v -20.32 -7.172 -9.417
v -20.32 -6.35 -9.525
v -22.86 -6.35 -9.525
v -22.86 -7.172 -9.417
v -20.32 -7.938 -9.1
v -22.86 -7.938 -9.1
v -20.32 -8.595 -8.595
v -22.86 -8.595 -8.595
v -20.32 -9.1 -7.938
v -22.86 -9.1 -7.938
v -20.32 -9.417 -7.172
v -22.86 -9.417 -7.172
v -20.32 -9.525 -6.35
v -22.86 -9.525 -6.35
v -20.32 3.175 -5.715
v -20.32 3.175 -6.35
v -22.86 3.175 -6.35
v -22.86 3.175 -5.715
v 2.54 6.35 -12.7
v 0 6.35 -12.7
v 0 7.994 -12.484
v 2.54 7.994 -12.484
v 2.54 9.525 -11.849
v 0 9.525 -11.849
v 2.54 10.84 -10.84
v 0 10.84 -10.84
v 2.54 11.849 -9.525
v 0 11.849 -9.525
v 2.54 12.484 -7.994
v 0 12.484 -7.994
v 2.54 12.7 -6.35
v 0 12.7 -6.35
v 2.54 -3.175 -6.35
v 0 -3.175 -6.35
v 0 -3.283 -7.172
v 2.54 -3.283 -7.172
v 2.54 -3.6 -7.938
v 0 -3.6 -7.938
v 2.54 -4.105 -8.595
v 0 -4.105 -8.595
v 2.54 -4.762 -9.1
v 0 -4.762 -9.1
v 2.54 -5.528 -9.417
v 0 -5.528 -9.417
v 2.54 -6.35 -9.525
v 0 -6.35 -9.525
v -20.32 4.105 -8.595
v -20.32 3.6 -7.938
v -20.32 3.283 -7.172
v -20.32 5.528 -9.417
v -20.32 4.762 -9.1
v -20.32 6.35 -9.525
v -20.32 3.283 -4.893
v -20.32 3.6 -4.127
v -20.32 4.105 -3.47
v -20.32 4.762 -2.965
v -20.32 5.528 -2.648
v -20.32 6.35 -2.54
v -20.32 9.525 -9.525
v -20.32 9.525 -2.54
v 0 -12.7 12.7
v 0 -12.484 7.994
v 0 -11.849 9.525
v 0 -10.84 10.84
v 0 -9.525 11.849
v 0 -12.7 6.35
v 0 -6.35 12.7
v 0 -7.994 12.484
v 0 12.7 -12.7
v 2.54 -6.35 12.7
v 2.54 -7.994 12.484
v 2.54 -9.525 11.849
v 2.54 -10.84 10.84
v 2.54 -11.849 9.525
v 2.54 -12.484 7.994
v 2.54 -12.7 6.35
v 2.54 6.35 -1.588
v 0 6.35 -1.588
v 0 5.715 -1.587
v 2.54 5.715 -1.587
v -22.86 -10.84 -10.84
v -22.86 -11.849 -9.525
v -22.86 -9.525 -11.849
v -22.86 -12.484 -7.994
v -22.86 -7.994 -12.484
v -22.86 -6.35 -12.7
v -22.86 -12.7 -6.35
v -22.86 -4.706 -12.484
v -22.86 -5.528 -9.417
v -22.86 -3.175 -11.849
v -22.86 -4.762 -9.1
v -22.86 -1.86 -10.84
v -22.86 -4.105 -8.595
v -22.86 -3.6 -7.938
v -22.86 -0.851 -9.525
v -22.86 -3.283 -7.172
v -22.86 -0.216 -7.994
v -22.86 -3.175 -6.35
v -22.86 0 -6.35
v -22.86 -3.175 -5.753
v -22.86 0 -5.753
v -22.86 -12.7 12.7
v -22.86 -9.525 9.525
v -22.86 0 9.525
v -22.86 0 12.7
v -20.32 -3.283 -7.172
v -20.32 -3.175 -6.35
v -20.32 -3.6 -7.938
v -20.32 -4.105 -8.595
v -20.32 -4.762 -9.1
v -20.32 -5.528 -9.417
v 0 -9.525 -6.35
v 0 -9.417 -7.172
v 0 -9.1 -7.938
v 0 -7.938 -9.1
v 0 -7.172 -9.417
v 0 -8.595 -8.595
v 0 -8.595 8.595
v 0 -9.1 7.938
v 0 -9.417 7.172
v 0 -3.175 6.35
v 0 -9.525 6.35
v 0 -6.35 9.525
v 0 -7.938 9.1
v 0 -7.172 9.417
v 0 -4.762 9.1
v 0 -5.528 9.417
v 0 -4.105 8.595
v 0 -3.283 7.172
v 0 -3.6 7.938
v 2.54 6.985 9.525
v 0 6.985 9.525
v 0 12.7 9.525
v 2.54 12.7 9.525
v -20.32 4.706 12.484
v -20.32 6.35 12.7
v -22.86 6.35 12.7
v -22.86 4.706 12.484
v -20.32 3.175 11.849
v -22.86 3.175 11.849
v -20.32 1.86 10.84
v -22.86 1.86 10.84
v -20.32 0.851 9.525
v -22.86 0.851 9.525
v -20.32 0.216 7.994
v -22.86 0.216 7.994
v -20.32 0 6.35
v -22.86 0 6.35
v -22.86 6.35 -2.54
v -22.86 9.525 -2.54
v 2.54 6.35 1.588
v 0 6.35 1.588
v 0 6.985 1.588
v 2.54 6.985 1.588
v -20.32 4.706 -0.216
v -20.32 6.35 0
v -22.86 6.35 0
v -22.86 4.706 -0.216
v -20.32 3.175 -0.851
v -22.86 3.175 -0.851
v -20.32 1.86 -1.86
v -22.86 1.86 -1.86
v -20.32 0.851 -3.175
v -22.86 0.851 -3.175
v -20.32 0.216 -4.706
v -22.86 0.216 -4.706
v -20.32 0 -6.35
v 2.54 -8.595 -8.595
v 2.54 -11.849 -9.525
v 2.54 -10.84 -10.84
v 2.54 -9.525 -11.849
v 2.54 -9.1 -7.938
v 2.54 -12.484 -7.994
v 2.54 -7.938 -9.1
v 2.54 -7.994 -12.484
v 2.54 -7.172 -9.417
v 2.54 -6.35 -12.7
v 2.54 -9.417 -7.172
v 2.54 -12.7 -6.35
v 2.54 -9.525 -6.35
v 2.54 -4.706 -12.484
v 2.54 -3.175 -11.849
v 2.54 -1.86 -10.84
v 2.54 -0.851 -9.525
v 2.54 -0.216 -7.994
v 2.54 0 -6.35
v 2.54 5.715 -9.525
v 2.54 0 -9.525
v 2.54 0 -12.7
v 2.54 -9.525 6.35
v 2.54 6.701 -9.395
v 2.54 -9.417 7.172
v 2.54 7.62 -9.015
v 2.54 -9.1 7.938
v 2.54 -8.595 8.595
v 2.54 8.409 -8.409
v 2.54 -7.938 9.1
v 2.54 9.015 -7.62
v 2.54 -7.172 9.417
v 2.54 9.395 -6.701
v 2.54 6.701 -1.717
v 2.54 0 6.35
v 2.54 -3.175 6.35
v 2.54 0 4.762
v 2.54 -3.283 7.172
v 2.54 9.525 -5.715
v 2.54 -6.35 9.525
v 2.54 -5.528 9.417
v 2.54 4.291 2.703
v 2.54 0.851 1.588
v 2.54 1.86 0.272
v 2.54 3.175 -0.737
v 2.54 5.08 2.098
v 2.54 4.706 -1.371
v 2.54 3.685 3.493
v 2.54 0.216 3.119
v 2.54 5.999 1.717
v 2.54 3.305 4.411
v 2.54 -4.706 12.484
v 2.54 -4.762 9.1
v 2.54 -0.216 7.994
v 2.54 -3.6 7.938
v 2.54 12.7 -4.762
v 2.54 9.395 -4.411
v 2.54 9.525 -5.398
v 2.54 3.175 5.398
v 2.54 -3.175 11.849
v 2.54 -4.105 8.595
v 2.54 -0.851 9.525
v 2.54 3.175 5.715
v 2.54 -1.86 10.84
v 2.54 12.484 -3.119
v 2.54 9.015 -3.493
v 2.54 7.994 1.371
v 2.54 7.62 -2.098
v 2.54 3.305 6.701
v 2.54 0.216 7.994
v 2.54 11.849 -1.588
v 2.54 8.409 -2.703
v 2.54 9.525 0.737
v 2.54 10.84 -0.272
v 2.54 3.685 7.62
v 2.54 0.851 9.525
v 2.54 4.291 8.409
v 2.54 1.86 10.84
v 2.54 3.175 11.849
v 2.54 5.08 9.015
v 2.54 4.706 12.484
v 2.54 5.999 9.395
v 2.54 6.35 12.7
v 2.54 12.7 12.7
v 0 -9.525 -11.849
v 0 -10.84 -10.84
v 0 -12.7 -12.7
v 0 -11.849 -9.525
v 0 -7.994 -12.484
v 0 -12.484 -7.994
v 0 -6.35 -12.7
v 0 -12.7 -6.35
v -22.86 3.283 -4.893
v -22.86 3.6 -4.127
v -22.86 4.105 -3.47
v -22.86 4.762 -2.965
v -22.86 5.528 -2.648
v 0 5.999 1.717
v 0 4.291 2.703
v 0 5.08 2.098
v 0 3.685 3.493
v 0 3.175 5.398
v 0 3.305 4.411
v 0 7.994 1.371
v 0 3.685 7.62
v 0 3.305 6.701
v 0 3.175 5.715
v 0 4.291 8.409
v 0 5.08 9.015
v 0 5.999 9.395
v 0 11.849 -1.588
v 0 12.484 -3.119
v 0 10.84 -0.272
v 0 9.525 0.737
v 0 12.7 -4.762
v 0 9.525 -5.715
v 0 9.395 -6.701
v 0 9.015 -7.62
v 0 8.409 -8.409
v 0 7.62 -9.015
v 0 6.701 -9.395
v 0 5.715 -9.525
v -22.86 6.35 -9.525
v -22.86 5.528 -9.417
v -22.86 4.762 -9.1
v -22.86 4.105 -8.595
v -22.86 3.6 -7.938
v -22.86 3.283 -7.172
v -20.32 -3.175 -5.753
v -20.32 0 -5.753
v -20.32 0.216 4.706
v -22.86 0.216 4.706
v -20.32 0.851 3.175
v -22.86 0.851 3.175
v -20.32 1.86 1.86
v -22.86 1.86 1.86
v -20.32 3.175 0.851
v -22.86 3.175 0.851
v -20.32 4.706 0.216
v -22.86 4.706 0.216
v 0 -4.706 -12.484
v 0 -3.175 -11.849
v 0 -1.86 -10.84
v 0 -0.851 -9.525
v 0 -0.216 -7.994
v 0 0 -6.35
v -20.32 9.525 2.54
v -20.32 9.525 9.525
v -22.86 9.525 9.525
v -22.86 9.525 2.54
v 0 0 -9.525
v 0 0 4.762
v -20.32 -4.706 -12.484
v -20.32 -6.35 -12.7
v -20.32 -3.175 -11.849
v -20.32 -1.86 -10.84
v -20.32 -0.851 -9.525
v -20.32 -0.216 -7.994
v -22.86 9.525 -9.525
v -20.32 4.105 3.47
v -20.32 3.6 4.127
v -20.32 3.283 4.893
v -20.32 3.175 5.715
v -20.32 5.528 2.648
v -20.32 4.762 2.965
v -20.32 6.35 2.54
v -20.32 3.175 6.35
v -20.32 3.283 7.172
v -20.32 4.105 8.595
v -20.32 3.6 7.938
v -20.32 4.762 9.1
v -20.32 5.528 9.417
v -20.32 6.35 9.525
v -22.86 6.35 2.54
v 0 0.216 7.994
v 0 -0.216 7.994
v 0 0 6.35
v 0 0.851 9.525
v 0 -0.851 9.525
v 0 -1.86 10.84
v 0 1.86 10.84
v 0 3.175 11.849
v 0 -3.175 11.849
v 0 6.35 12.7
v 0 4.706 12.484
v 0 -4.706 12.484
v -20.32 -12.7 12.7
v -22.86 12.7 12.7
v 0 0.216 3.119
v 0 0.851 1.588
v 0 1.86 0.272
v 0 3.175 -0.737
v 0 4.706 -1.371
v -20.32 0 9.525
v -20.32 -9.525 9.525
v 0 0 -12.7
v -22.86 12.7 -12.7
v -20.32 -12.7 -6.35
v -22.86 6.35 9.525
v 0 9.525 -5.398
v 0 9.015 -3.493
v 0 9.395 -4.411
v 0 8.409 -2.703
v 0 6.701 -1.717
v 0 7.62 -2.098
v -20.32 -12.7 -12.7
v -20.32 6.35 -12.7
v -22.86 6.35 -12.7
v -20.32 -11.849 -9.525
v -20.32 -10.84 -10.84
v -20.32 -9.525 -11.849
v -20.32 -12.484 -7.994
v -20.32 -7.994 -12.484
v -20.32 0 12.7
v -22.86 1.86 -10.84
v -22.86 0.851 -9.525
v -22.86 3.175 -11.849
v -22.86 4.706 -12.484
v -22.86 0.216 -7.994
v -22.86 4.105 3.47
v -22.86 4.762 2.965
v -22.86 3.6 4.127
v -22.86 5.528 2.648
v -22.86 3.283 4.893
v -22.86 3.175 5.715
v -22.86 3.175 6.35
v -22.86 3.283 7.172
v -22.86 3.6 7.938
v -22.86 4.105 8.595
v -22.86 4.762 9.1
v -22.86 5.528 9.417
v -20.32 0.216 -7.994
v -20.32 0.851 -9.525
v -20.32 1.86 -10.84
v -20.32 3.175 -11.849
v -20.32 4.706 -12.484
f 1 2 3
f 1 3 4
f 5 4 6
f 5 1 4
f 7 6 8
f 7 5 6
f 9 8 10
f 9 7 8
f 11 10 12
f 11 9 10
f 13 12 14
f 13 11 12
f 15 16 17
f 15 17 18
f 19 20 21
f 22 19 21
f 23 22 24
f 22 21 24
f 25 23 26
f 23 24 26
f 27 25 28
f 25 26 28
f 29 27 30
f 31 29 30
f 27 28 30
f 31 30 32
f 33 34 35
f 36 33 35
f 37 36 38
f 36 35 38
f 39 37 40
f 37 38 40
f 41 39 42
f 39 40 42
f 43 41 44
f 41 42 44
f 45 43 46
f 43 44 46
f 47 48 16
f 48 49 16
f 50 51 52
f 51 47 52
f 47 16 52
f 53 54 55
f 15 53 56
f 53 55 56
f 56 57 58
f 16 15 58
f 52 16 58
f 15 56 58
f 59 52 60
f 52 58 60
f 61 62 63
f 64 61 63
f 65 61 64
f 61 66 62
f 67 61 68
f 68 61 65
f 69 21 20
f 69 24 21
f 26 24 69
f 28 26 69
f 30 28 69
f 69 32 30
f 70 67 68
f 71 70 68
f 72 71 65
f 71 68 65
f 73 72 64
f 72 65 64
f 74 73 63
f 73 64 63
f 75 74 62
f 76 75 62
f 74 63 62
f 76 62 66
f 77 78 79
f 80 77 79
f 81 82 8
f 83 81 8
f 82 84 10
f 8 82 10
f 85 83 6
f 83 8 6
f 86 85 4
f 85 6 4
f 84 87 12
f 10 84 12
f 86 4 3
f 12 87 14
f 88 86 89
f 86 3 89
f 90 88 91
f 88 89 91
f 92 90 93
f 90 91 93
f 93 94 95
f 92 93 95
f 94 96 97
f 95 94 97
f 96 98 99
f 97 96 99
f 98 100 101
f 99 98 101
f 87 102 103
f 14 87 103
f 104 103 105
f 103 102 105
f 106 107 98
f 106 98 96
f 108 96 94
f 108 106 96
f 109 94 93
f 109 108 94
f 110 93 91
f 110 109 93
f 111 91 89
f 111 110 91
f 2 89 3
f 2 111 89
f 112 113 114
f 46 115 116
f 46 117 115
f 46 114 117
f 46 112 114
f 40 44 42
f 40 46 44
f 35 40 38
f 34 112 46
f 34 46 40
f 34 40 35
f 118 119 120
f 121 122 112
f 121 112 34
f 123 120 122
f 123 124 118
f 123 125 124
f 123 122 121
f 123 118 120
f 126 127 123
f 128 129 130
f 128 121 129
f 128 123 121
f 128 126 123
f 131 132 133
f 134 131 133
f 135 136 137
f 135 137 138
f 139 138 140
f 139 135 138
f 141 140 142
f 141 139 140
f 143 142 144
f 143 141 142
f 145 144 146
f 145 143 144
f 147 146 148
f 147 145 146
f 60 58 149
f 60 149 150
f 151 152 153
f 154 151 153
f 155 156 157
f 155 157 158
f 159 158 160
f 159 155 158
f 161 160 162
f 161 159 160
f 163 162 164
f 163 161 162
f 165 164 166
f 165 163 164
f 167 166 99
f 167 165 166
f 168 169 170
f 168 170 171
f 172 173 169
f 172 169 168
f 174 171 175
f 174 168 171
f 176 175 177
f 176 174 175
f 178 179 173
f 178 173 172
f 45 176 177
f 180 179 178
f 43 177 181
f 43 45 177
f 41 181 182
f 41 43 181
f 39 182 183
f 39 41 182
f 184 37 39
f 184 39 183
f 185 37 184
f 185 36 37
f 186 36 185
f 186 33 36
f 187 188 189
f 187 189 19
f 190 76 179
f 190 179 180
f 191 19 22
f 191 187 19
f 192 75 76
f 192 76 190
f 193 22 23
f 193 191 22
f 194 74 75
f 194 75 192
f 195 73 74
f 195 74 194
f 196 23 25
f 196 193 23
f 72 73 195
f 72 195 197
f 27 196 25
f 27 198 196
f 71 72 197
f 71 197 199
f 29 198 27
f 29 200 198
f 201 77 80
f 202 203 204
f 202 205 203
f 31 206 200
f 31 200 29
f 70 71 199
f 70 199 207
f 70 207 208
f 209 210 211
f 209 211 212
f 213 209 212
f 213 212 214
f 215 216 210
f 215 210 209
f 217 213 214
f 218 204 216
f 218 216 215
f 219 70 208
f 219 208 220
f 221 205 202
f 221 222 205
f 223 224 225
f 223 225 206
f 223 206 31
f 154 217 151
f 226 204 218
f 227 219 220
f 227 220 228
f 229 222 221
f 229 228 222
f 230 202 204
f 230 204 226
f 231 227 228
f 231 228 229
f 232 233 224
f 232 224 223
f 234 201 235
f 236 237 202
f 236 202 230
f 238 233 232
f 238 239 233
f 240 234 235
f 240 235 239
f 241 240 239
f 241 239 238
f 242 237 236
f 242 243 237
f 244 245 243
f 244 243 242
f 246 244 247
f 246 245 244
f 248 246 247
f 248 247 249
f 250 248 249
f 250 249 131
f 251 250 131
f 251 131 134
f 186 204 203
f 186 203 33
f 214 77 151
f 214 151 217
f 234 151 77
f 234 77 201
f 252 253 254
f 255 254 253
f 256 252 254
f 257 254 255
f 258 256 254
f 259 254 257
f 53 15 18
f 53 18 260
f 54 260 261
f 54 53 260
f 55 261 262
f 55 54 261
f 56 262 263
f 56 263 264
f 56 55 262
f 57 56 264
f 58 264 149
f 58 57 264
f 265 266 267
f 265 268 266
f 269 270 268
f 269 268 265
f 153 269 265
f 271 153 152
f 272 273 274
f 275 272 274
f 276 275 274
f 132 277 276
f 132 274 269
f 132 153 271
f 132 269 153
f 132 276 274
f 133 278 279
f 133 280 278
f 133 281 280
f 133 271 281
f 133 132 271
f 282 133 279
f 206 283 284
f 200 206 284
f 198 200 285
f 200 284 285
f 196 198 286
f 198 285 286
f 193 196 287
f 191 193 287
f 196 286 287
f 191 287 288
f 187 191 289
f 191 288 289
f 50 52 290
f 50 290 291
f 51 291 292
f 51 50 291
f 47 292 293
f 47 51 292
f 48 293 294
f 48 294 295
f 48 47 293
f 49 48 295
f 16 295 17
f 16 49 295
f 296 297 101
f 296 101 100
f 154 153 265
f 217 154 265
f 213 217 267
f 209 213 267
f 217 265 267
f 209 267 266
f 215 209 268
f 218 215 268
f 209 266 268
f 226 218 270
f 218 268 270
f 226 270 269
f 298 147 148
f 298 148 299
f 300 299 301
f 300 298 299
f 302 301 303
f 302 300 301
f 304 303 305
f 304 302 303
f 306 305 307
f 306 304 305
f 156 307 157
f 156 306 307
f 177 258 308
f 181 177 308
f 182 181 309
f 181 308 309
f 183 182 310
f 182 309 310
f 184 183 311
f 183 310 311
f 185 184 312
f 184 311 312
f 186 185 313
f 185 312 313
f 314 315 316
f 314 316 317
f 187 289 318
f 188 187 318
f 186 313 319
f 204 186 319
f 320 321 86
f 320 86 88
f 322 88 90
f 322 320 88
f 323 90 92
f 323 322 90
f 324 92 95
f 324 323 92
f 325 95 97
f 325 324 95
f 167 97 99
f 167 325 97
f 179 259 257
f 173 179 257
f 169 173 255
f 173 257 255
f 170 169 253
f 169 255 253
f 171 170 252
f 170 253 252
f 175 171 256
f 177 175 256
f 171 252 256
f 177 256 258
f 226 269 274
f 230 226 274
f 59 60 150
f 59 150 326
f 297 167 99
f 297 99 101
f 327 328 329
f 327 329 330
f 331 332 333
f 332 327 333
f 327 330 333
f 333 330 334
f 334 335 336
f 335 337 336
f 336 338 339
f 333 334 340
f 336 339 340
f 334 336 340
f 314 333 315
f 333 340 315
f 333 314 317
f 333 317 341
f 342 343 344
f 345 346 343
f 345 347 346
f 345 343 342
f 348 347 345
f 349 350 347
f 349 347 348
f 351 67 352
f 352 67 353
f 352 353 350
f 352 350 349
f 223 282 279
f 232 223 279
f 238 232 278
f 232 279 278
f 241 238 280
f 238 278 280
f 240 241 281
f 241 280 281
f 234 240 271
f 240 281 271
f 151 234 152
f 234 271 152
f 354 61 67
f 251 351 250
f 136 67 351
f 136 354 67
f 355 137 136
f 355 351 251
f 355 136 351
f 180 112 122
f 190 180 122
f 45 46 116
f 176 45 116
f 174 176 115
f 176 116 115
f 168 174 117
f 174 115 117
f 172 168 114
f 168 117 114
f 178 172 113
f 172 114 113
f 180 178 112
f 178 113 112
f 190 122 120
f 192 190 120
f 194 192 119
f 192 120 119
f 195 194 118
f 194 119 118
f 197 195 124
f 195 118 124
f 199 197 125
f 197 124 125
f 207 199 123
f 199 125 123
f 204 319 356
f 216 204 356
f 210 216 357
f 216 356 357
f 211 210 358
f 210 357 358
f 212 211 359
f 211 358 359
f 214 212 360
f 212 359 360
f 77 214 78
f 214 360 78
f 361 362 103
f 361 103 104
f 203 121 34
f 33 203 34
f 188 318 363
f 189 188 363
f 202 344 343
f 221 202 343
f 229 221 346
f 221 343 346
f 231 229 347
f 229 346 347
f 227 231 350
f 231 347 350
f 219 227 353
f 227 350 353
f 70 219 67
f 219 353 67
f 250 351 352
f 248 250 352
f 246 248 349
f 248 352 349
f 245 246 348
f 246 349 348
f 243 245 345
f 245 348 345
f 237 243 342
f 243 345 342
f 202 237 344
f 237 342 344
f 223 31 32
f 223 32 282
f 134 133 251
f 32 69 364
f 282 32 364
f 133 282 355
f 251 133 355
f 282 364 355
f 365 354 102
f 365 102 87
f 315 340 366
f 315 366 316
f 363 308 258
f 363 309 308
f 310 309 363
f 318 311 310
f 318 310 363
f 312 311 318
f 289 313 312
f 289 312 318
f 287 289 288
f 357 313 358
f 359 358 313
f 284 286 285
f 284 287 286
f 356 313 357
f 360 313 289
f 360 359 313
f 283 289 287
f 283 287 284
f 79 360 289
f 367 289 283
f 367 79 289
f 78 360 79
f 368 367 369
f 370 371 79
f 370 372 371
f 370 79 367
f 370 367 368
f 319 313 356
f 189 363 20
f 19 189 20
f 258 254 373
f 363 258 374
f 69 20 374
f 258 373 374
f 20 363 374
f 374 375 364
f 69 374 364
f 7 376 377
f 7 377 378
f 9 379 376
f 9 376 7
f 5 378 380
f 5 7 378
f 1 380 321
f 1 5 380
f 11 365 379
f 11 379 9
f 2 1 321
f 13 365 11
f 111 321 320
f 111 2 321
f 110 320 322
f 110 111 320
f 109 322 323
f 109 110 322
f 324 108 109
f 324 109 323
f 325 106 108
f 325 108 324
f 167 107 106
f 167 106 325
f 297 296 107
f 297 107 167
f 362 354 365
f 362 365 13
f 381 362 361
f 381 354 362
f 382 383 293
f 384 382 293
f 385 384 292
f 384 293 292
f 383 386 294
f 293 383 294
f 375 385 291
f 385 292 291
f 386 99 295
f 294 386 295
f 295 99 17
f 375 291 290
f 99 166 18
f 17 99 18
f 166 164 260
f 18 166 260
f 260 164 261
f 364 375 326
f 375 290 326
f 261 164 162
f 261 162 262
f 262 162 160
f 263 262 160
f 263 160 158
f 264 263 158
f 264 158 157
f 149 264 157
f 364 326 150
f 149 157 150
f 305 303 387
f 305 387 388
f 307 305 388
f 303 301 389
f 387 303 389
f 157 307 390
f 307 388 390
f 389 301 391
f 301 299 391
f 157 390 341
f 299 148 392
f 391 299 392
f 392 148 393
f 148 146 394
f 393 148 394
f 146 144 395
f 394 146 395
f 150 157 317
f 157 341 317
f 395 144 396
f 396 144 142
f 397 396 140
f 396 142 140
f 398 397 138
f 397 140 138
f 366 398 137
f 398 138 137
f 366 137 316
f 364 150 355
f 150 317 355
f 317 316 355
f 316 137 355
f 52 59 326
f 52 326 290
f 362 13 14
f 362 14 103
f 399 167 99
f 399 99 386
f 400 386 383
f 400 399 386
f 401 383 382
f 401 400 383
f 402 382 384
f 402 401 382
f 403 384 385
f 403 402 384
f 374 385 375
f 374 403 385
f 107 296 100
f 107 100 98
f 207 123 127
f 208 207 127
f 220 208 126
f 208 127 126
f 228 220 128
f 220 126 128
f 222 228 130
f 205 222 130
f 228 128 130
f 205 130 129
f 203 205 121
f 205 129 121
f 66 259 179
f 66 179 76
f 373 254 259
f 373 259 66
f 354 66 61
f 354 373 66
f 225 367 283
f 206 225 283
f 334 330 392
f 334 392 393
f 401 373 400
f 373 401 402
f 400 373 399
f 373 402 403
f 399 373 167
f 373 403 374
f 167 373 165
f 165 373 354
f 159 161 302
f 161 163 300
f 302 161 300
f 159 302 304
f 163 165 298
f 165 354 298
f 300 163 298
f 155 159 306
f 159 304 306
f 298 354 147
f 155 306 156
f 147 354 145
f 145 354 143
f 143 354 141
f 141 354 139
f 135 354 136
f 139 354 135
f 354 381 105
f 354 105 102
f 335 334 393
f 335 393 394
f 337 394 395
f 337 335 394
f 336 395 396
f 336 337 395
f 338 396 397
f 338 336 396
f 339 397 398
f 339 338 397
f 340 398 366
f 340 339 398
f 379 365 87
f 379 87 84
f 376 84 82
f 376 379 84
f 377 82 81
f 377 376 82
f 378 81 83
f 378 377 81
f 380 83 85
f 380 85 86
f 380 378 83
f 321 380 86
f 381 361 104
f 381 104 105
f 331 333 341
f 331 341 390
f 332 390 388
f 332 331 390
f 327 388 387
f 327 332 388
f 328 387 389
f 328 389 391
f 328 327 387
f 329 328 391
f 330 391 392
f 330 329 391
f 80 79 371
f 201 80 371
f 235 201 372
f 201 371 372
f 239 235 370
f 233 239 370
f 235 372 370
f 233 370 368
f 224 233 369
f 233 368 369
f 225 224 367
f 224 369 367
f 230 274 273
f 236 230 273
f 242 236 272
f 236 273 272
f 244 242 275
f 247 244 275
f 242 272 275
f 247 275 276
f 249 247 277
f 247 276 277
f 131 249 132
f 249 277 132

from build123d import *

# Parameters (mm, degrees)
F3_DEPTH = 2.54
F4_DEPTH = 2.54
F5_W     = 25.4
F5_H     = 25.4
F6_DEPTH = 20.32


with BuildPart() as f3:
    # F0 (on Right) → F3 (new body)
    with BuildSketch(Plane.YZ):
        with BuildLine():
            Line((0, 4.7625), (0, 6.35))
            ThreePointArc((0, 6.35), (-1.8598719395, 10.8401280605), (-6.35, 12.7))
            ThreePointArc((-6.35, 12.7), (-10.8401280605, 10.8401280605), (-12.7, 6.35))
            Line((-12.7, 6.35), (-12.7, -6.35))
            ThreePointArc((-12.7, -6.35), (-10.8401280605, -10.8401280605), (-6.35, -12.7))
            ThreePointArc((-6.35, -12.7), (-1.8598719395, -10.8401280605), (0, -6.35))
            Line((0, -6.35), (0, -3.81))
            Line((0, -3.81), (0, 4.7625))
        make_face()
        with BuildLine():
            ThreePointArc((-6.35, 9.525), (-4.1049359697, 8.5950640303), (-3.175, 6.35))
            Line((-3.175, 6.35), (-3.175, -6.35))
            ThreePointArc((-3.175, -6.35), (-4.1049359697, -8.5950640303), (-6.35, -9.525))
            ThreePointArc((-6.35, -9.525), (-8.5950640303, -8.5950640303), (-9.525, -6.35))
            Line((-9.525, -6.35), (-9.525, 6.35))
            ThreePointArc((-9.525, 6.35), (-8.5950640303, 8.5950640303), (-6.35, 9.525))
        make_face(mode=Mode.SUBTRACT)
        with BuildLine():
            Line((12.7, 12.7), (11.43, 12.7))
            Line((11.43, 12.7), (6.35, 12.7))
            ThreePointArc((6.35, 12.7), (1.8598719395, 10.8401280605), (0, 6.35))
            Line((0, 6.35), (0, 4.7625))
            ThreePointArc((0, 4.7625), (1.8598719395, 0.2723719395), (6.35, -1.5875))
            Line((6.35, -1.5875), (5.715, -1.5875))
            ThreePointArc((5.715, -1.5875), (8.4090768363, -2.7034231637), (9.525, -5.3975))
            Line((9.525, -5.3975), (9.525, -5.715))
            ThreePointArc((9.525, -5.715), (8.4090768363, -8.4090768363), (5.715, -9.525))
            Line((5.715, -9.525), (1.27, -9.525))
            Line((1.27, -9.525), (0, -9.525))
            Line((0, -9.525), (0, -12.7))
            Line((0, -12.7), (1.27, -12.7))
            Line((1.27, -12.7), (6.35, -12.7))
            ThreePointArc((6.35, -12.7), (10.8401280605, -10.8401280605), (12.7, -6.35))
            Line((12.7, -6.35), (12.7, -4.7625))
            ThreePointArc((12.7, -4.7625), (10.8401280605, -0.2723719395), (6.35, 1.5875))
            Line((6.35, 1.5875), (6.985, 1.5875))
            ThreePointArc((6.985, 1.5875), (4.2909231637, 2.7034231637), (3.175, 5.3975))
            Line((3.175, 5.3975), (3.175, 5.715))
            ThreePointArc((3.175, 5.715), (4.2909231637, 8.4090768363), (6.985, 9.525))
            Line((6.985, 9.525), (11.43, 9.525))
            Line((11.43, 9.525), (12.7, 9.525))
            Line((12.7, 9.525), (12.7, 12.7))
        make_face()
    extrude(amount=F3_DEPTH)



with BuildPart() as f4:
    # F2 (on offset) → F4 (new body)
    with BuildSketch(Plane.YZ.offset(-20.32)):
        with BuildLine():
            Line((12.7, -12.7), (12.7, 12.7))
            Line((12.7, 12.7), (6.35, 12.7))
            ThreePointArc((6.35, 12.7), (1.8598719395, 10.8401280605), (0, 6.35))
            ThreePointArc((0, 6.35), (1.8598719395, 1.8598719395), (6.35, 0))
            ThreePointArc((6.35, 0), (1.8598719395, -1.8598719395), (0, -6.35))
            ThreePointArc((0, -6.35), (1.8598719395, -10.8401280605), (6.35, -12.7))
            Line((6.35, -12.7), (12.7, -12.7))
        make_face()
        with BuildLine():
            Line((9.525, -2.54), (9.525, -9.525))
            Line((9.525, -9.525), (6.35, -9.525))
            ThreePointArc((6.35, -9.525), (4.1049359697, -8.5950640303), (3.175, -6.35))
            Line((3.175, -6.35), (3.175, -5.715))
            ThreePointArc((3.175, -5.715), (4.1049359697, -3.4699359697), (6.35, -2.54))
            Line((6.35, -2.54), (9.525, -2.54))
        make_face(mode=Mode.SUBTRACT)
        with BuildLine():
            Line((6.35, 9.525), (9.525, 9.525))
            Line((9.525, 9.525), (9.525, 2.54))
            Line((9.525, 2.54), (6.35, 2.54))
            ThreePointArc((6.35, 2.54), (4.1049359697, 3.4699359697), (3.175, 5.715))
            Line((3.175, 5.715), (3.175, 6.35))
            ThreePointArc((3.175, 6.35), (4.1049359697, 8.5950640303), (6.35, 9.525))
        make_face(mode=Mode.SUBTRACT)
    extrude(amount=-F4_DEPTH)


with BuildPart() as f4b:
    # F2 (on offset) → F4, piece 2 (new body)
    with BuildSketch(Plane.YZ.offset(-20.32)):
        with BuildLine():
            ThreePointArc((-6.35, -12.7), (-1.8598719395, -10.8401280605), (0, -6.35))
            Line((0, -6.35), (0, -5.7529052719))
            Line((0, -5.7529052719), (-3.175, -5.7529052719))
            Line((-3.175, -5.7529052719), (-3.175, -6.35))
            ThreePointArc((-3.175, -6.35), (-4.1049359697, -8.5950640303), (-6.35, -9.525))
            ThreePointArc((-6.35, -9.525), (-8.5950640303, -8.5950640303), (-9.525, -6.35))
            Line((-9.525, -6.35), (-9.525, 9.525))
            Line((-9.525, 9.525), (0, 9.525))
            Line((0, 9.525), (0, 12.7))
            Line((0, 12.7), (-12.7, 12.7))
            Line((-12.7, 12.7), (-12.7, -6.35))
            ThreePointArc((-12.7, -6.35), (-10.8401280605, -10.8401280605), (-6.35, -12.7))
        make_face()
    extrude(amount=-F4_DEPTH)


with BuildPart() as f3_1:
    add(f3.part)

    add(f4.part)  # F6 merges F4
    # F5 (on face) → F6 (join)
    with BuildSketch(Plane.YZ.offset(-20.32)):
        Rectangle(F5_W, F5_H)
    extrude(amount=F6_DEPTH)


solid = Compound([f4b.part, f3_1.part])
